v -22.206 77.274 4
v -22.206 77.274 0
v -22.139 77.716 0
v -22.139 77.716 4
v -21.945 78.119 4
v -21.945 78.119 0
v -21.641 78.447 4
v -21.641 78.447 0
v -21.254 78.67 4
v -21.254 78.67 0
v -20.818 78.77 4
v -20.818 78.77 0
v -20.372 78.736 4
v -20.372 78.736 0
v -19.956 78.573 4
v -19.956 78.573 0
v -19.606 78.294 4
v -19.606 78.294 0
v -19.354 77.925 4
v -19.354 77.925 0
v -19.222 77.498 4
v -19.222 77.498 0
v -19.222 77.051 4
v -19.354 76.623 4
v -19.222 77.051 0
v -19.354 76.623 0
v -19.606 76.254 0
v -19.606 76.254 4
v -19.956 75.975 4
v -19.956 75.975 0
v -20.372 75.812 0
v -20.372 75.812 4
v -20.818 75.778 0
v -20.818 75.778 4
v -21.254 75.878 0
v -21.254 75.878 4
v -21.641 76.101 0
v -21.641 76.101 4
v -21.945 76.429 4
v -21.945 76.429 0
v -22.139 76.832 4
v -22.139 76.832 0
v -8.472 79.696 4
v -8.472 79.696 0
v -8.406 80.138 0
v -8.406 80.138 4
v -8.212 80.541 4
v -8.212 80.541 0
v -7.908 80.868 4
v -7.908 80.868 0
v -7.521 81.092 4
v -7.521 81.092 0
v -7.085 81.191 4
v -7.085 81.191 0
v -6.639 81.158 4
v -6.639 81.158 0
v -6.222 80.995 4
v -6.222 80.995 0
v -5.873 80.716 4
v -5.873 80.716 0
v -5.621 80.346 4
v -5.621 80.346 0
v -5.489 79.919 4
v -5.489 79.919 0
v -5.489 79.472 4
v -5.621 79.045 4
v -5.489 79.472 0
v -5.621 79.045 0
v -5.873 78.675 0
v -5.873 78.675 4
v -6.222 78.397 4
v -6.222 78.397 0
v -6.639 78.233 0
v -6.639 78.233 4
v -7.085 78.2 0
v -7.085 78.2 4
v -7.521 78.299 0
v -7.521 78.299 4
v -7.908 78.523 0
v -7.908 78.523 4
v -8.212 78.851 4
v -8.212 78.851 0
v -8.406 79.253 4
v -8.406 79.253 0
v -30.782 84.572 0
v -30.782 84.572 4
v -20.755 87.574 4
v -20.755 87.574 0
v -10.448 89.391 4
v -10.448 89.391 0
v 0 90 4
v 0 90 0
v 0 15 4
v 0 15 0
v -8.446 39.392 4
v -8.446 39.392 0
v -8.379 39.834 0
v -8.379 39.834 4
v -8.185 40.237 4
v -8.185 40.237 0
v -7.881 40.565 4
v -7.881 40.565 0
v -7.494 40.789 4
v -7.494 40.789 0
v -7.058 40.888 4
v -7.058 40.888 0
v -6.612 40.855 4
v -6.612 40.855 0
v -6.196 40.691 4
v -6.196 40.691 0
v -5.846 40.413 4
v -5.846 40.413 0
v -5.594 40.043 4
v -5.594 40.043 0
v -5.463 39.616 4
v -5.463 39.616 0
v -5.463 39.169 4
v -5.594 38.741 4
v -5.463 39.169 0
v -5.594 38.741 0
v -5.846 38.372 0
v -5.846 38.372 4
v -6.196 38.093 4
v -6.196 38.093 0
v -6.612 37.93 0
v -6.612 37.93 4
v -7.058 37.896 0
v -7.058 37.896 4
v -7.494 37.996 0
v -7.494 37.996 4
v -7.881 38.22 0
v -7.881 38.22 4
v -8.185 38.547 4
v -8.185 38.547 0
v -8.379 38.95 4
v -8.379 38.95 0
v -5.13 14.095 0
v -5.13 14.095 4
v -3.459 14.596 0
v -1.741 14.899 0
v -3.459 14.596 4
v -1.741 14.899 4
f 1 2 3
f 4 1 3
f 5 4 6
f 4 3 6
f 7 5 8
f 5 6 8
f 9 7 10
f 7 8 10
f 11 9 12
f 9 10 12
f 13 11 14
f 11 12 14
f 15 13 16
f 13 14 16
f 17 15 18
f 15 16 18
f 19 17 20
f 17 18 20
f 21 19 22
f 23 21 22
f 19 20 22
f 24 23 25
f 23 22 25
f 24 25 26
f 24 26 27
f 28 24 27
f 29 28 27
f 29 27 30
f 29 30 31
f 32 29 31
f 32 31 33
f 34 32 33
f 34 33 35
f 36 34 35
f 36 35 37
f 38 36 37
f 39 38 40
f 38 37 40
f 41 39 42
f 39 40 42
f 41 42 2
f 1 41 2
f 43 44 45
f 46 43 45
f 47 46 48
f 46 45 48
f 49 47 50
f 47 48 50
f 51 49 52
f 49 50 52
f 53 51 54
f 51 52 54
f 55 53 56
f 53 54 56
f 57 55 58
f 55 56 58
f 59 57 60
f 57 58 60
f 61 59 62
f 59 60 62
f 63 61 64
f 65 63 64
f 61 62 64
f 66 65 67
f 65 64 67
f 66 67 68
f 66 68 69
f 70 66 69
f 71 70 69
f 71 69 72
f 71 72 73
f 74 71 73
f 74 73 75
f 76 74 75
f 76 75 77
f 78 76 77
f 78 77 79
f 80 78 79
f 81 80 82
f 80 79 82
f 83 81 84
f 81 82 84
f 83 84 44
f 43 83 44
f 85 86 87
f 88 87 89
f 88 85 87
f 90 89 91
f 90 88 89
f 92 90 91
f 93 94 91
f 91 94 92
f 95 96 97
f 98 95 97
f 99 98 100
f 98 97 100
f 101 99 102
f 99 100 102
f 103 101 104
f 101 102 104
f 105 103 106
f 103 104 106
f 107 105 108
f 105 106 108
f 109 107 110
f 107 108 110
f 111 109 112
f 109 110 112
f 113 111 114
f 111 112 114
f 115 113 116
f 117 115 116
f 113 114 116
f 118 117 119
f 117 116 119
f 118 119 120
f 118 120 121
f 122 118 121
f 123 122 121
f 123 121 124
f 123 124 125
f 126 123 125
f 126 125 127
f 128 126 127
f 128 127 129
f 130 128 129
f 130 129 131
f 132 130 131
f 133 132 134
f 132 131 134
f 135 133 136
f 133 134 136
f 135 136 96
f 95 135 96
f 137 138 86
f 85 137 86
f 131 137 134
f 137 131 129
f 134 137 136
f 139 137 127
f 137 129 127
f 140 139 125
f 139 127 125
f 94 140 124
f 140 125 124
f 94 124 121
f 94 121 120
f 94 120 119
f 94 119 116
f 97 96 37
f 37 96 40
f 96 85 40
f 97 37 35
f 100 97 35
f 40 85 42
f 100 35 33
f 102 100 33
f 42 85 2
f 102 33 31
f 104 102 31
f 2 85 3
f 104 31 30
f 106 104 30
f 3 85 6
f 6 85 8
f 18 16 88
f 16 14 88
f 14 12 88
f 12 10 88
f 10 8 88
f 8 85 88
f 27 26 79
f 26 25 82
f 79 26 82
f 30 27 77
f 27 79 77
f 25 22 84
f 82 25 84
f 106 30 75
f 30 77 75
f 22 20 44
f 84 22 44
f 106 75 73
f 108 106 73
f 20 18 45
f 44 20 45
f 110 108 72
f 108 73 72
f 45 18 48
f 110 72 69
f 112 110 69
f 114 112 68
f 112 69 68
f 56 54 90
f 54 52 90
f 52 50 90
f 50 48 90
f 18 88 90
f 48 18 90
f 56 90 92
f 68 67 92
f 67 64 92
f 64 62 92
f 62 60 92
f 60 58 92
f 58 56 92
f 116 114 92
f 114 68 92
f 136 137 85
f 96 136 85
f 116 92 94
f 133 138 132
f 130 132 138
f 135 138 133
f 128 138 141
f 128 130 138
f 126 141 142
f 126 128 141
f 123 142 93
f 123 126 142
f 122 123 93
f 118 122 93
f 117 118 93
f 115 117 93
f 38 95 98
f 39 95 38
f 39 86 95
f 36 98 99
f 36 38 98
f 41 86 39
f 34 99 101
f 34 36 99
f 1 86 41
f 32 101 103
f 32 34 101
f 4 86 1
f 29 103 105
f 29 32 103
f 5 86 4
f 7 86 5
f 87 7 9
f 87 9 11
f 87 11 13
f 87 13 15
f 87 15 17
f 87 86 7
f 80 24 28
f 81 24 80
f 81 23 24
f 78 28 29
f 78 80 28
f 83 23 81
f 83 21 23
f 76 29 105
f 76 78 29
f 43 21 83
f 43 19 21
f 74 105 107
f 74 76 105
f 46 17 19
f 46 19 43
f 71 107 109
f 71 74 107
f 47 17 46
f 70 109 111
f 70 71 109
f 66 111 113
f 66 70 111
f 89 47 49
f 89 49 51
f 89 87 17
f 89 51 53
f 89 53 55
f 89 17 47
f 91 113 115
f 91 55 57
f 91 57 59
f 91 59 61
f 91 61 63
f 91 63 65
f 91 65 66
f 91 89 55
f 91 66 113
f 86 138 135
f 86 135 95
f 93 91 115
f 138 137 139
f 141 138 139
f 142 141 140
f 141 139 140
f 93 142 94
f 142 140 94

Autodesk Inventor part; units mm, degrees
ref_plane "YZ Plane" through (0, 0, 0) normal (1, 0, 0) x (0, 1, 0)
ref_plane "XZ Plane" through (0, 0, 0) normal (0, 1, 0) x (-1, 0, 0)
ref_plane "XY Plane" through (0, 0, 0) normal (0, 0, 1) x (1, 0, 0)
sketch "Sketch1" plane through (0, 0, 0) normal (0, 0, 1) x (1, 0, 0)
  arc A0 (0, 90) -> (77.9423, -45) centre (0, 0) ccw
  line L0 (0, 5) -> (0, 90)
  line L1 (77.9423, -45) -> (4.3301, -2.5)
  line L2 (0, 5) -> (0, 0)
  line L3 (0, 0) -> (4.3301, -2.5)
  line L4 (0, -167.6192) -> (0, 145.1192) projected
  dimension "d0" = 120
  dimension "d2" = 90
extrude "Extrusion1" add sketch "Sketch1" along normal blind 4
sketch "Sketch2" plane through (0, 0, 0) normal (0, 0, -1) x (-1, 0, 0)
  circle A0 centre (20.7055, 77.2741) radius 1.5
  circle A1 centre (6.9459, 39.3923) radius 1.5
  line L0 (0, 0) -> (0, 90) projected
  line L1 (20.7055, 77.2741) -> (0, 0)
  circle A2 centre (6.9725, 79.6956) radius 1.5
  line L2 (6.9725, 79.6956) -> (0, 0)
  line L3 (6.9459, 39.3923) -> (0, 0)
  dimension "d5" = 3
  dimension "d6" = 3
  dimension "d7" = 80
  dimension "d9" = 15
  dimension "d16" = 80
  dimension "d17" = 3
  dimension "d18" = 5
  dimension "d27" = 5
  dimension "d28" = 40
extrude "Extrusion2" cut sketch "Sketch2" against normal blind 10
pattern_circular "Circular Pattern1" count 12 over 220 about axis through (0, 0, 0) along (0, 0, 1) of "Extrusion2"
sketch "Sketch4" plane through (0, 0, 0) normal (0, 0, -1) x (-1, 0, 0)
  circle A0 centre (0, 0) radius 15
  dimension "d29" = 30
extrude "Extrusion4" cut sketch "Sketch4" against normal blind 10
sketch "Sketch5" plane through (0, 0, 4) normal (0, 0, 1) x (1, 0, 0)
  arc A0 (0, 15) -> (12.9904, -7.5) centre (0, 0) ccw projected
  line L0 (0, 0) -> (-30.7818, 84.5723)
  arc A1 (0, 90) -> (77.9423, -45) centre (0, 0) ccw projected
  line L1 (0, 0) -> (77.9423, -45)
  arc A2 (-30.7818, 84.5723) -> (77.9423, -45) centre (0, 0) ccw
  line L2 (0, 15) -> (0, 90) projected
  point P0 (12.9904, -7.5)
  point P1 (-5.1303, 14.0954)
  dimension "d32" = 20
extrude "Extrusion5" cut sketch "Sketch5" against normal blind 10 contours A0 L1 A1 L0
properties part number "cover2"
